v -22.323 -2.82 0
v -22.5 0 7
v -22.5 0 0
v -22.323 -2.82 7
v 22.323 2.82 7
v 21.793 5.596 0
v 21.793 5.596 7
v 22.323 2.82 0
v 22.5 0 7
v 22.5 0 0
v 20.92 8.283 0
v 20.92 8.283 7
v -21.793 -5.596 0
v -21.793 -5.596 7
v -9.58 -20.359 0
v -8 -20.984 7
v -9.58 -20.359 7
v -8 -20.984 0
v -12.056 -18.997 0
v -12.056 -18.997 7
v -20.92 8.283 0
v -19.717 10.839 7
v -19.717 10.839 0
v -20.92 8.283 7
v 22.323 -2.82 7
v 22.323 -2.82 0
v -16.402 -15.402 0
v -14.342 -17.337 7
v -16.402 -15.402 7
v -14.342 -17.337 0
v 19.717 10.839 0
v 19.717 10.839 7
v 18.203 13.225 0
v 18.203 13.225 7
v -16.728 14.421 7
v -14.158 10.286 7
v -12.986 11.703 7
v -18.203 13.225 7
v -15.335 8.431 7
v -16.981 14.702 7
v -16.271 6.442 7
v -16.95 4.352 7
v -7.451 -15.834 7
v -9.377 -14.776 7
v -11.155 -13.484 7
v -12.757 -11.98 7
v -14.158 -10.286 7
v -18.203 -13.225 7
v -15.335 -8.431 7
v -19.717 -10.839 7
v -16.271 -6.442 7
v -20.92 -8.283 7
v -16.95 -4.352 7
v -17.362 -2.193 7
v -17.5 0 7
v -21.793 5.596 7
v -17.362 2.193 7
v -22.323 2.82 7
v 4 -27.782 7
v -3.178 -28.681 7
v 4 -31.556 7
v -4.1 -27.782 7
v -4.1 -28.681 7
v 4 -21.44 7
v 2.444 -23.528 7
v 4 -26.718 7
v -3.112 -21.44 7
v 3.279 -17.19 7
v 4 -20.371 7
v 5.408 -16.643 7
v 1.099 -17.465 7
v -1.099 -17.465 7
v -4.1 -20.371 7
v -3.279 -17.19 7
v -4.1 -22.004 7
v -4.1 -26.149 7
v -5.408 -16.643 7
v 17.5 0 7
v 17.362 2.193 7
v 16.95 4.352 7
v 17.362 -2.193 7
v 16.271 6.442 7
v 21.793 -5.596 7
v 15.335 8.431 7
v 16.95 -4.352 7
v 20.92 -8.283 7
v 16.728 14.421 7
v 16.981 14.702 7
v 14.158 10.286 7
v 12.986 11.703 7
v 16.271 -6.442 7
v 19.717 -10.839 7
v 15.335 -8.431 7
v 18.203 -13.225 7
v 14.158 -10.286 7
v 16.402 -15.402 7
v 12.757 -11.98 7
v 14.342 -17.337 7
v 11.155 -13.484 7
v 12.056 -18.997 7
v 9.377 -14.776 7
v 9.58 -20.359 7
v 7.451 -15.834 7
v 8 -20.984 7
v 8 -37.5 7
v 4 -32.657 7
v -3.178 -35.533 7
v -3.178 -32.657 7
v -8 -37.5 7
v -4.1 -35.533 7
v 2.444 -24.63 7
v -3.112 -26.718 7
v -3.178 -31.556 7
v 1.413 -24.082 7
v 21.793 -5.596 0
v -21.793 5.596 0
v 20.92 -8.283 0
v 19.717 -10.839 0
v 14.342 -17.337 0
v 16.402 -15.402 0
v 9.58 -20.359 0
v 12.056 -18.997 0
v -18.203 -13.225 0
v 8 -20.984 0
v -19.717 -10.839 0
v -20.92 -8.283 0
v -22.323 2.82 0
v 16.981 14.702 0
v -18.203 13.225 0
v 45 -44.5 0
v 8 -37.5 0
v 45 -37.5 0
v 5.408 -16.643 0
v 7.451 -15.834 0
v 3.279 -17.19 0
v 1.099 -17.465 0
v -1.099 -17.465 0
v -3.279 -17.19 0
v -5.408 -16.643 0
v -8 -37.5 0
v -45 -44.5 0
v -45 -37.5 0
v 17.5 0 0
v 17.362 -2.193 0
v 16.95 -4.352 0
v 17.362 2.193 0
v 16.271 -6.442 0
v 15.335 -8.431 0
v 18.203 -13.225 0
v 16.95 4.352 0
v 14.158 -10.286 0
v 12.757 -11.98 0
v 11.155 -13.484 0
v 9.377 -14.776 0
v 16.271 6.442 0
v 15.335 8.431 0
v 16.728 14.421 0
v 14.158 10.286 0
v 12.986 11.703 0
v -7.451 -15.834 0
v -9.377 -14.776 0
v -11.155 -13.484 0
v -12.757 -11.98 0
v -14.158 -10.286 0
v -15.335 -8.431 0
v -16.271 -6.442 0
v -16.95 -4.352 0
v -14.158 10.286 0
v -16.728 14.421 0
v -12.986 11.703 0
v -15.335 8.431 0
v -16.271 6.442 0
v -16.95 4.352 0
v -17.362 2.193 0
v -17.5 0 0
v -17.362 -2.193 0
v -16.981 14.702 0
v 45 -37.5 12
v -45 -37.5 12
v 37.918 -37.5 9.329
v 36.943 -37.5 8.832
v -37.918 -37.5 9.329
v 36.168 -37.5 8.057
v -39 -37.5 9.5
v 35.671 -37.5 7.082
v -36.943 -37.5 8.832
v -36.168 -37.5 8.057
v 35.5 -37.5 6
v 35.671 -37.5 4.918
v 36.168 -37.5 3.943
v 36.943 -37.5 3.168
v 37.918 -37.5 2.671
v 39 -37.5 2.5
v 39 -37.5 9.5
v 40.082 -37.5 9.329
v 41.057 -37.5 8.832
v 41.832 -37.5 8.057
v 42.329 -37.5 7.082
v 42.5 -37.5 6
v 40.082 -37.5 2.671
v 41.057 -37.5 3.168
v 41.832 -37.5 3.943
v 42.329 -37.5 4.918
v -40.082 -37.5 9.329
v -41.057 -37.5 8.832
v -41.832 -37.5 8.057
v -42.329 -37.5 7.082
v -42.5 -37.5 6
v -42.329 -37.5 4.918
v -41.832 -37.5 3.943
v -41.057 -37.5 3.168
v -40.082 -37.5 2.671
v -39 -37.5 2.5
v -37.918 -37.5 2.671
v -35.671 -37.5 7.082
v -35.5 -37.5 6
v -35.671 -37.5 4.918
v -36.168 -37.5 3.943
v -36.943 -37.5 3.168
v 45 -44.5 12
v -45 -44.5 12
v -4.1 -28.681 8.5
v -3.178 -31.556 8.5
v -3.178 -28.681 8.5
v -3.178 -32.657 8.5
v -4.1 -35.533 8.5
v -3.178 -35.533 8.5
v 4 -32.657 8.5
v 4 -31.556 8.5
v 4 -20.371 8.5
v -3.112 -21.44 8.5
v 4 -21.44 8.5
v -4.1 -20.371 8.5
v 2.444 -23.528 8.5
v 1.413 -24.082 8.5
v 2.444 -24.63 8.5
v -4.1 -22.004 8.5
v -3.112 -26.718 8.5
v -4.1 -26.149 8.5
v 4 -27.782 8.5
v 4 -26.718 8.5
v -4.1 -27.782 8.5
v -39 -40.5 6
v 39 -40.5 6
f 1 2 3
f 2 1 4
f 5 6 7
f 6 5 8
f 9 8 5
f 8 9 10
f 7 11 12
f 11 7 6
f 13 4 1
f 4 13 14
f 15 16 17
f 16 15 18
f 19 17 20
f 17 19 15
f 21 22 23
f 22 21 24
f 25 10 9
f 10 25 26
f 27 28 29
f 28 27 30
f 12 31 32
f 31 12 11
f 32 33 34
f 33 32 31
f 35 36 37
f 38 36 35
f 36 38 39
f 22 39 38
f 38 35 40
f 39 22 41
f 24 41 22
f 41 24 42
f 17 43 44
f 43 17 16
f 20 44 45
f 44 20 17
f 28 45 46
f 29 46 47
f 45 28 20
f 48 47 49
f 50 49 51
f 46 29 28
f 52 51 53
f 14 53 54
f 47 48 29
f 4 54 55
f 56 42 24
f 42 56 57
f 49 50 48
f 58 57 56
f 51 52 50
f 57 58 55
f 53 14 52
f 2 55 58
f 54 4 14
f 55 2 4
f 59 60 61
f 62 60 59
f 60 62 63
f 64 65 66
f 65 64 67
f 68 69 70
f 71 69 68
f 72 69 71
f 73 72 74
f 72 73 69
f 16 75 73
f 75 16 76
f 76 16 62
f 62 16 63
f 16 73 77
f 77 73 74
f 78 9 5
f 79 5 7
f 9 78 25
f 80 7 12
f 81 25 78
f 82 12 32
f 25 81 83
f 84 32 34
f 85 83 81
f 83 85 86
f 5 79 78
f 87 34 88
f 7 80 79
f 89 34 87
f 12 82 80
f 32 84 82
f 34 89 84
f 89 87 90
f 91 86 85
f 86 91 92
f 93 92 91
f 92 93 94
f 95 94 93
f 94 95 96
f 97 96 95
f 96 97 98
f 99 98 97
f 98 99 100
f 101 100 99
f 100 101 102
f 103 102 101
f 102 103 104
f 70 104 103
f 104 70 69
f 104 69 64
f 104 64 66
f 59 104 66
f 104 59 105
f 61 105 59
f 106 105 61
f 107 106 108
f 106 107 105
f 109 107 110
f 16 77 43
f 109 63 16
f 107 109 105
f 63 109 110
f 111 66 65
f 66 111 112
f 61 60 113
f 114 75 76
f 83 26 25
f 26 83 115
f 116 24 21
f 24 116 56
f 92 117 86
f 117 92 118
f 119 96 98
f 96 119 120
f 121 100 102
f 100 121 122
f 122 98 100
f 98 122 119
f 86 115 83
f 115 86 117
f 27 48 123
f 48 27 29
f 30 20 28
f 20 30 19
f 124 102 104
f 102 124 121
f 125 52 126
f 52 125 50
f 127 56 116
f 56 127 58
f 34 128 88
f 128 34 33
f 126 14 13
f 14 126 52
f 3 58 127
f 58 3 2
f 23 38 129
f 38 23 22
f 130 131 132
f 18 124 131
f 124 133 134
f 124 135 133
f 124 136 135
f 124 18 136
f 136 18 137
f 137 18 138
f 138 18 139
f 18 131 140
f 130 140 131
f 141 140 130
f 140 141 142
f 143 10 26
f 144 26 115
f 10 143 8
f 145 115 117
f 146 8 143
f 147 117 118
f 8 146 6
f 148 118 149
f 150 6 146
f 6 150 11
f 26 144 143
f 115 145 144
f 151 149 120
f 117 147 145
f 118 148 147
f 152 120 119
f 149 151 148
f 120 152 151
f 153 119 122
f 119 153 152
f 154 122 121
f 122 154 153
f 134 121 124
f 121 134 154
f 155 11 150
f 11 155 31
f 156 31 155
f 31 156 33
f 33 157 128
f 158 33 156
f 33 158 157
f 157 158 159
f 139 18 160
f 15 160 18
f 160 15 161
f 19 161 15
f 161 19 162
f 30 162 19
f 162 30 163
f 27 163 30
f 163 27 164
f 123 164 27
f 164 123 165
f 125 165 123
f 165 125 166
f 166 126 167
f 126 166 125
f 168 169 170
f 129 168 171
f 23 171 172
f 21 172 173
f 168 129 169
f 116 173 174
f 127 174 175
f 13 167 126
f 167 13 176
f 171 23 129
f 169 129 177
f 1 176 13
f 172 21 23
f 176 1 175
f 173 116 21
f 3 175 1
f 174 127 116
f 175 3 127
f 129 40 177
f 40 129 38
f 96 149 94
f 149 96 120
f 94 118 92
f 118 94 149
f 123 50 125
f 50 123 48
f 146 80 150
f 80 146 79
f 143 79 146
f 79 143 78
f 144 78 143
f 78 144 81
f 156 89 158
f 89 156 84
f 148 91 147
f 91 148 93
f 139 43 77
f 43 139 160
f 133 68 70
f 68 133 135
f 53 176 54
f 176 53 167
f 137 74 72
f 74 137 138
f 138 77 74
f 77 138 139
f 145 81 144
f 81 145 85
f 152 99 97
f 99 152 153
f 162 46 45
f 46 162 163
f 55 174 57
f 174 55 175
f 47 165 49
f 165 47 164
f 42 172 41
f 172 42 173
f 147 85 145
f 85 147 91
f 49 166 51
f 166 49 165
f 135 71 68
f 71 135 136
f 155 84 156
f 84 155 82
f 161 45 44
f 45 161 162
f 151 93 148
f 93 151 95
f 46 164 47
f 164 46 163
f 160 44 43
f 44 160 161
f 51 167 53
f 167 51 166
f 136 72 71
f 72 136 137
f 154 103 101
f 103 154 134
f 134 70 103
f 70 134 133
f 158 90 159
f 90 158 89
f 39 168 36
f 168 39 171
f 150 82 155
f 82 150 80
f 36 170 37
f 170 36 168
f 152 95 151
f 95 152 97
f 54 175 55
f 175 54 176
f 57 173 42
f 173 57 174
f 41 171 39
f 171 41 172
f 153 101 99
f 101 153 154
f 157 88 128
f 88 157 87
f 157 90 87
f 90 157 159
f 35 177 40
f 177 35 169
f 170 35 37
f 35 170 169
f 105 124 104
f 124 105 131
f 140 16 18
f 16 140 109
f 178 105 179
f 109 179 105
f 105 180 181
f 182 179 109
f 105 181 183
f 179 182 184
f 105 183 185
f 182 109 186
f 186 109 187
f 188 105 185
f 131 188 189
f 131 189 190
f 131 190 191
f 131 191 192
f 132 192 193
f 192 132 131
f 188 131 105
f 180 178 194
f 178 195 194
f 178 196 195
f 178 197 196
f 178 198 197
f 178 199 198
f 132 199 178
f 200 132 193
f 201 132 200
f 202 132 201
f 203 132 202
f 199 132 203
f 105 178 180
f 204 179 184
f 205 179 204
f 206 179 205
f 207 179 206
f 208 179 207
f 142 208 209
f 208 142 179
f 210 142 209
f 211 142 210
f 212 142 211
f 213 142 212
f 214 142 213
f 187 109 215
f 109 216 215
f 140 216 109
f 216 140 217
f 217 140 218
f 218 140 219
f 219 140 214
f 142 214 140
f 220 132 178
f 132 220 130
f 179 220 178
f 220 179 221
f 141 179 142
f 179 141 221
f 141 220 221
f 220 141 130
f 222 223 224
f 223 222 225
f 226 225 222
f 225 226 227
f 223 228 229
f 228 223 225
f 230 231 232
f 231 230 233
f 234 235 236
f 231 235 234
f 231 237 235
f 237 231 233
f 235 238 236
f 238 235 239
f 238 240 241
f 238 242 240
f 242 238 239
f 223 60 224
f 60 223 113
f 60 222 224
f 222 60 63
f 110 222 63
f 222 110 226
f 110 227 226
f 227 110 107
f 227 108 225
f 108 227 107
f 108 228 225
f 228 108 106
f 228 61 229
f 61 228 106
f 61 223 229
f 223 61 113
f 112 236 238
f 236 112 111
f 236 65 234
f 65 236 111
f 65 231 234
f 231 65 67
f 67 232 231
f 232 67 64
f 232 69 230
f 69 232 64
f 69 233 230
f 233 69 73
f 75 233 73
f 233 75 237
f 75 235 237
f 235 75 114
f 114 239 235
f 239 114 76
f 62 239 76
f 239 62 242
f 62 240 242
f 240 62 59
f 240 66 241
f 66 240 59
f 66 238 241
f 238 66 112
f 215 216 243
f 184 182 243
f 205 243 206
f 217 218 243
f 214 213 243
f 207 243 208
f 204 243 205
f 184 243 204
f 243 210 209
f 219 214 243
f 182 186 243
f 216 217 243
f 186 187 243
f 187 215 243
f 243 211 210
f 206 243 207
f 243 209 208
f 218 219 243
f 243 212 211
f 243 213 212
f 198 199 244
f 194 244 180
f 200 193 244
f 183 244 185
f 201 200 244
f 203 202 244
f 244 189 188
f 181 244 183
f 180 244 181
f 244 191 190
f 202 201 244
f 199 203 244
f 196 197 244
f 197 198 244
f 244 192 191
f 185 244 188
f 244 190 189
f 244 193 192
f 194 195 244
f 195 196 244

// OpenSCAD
// configuration values
l   = 27;  // distance between ground and inner clip
h   = 7;   // height of clip
t   = 5;   // thickness of clip
w   = 90;  // width of ground plate
fs  = 8;   // font size

// internal variables, not change these
in  = 35 / 2;
out = in + t;
d   = l + in;

content = "TM";
font = "Droid Sans Mono Bold";

difference() {
  union() {
    difference() {
      difference() {
        cylinder(r1=out, r2=out, h=h, $fn=50);
        cylinder(r1=in, r2=in, h=h, $fn=50);
      }
      translate([0,33,0]) cylinder(r1=25, r2=25, h=h);
    }
    translate([-w/2,-d,0]) {
      cube(size = [w,7,h+5]);
    }
    difference() {
      translate([-fs,-d+7,0]) cube(size=[fs*2,d-7-in+2,h]);
      translate([0,1,0]) cylinder(r=out, h=h);
    }
    rotate([0,0,90]) {
      translate ([-d+9,-fs/2,h]) {
        linear_extrude(height=1.5) {
          text(content, font=font, size=fs);
        }
      }
    }
  }
  translate([-(w/2-6),-d+7,(h+5)/2]) rotate([90]) cylinder(h=3, r1=3.5, r2=0, $fn=20);
  translate([w/2-6,-d+7,(h+5)/2])  rotate([90]) cylinder(h=3, r1=3.5, r2=0, $fn=20);
}
